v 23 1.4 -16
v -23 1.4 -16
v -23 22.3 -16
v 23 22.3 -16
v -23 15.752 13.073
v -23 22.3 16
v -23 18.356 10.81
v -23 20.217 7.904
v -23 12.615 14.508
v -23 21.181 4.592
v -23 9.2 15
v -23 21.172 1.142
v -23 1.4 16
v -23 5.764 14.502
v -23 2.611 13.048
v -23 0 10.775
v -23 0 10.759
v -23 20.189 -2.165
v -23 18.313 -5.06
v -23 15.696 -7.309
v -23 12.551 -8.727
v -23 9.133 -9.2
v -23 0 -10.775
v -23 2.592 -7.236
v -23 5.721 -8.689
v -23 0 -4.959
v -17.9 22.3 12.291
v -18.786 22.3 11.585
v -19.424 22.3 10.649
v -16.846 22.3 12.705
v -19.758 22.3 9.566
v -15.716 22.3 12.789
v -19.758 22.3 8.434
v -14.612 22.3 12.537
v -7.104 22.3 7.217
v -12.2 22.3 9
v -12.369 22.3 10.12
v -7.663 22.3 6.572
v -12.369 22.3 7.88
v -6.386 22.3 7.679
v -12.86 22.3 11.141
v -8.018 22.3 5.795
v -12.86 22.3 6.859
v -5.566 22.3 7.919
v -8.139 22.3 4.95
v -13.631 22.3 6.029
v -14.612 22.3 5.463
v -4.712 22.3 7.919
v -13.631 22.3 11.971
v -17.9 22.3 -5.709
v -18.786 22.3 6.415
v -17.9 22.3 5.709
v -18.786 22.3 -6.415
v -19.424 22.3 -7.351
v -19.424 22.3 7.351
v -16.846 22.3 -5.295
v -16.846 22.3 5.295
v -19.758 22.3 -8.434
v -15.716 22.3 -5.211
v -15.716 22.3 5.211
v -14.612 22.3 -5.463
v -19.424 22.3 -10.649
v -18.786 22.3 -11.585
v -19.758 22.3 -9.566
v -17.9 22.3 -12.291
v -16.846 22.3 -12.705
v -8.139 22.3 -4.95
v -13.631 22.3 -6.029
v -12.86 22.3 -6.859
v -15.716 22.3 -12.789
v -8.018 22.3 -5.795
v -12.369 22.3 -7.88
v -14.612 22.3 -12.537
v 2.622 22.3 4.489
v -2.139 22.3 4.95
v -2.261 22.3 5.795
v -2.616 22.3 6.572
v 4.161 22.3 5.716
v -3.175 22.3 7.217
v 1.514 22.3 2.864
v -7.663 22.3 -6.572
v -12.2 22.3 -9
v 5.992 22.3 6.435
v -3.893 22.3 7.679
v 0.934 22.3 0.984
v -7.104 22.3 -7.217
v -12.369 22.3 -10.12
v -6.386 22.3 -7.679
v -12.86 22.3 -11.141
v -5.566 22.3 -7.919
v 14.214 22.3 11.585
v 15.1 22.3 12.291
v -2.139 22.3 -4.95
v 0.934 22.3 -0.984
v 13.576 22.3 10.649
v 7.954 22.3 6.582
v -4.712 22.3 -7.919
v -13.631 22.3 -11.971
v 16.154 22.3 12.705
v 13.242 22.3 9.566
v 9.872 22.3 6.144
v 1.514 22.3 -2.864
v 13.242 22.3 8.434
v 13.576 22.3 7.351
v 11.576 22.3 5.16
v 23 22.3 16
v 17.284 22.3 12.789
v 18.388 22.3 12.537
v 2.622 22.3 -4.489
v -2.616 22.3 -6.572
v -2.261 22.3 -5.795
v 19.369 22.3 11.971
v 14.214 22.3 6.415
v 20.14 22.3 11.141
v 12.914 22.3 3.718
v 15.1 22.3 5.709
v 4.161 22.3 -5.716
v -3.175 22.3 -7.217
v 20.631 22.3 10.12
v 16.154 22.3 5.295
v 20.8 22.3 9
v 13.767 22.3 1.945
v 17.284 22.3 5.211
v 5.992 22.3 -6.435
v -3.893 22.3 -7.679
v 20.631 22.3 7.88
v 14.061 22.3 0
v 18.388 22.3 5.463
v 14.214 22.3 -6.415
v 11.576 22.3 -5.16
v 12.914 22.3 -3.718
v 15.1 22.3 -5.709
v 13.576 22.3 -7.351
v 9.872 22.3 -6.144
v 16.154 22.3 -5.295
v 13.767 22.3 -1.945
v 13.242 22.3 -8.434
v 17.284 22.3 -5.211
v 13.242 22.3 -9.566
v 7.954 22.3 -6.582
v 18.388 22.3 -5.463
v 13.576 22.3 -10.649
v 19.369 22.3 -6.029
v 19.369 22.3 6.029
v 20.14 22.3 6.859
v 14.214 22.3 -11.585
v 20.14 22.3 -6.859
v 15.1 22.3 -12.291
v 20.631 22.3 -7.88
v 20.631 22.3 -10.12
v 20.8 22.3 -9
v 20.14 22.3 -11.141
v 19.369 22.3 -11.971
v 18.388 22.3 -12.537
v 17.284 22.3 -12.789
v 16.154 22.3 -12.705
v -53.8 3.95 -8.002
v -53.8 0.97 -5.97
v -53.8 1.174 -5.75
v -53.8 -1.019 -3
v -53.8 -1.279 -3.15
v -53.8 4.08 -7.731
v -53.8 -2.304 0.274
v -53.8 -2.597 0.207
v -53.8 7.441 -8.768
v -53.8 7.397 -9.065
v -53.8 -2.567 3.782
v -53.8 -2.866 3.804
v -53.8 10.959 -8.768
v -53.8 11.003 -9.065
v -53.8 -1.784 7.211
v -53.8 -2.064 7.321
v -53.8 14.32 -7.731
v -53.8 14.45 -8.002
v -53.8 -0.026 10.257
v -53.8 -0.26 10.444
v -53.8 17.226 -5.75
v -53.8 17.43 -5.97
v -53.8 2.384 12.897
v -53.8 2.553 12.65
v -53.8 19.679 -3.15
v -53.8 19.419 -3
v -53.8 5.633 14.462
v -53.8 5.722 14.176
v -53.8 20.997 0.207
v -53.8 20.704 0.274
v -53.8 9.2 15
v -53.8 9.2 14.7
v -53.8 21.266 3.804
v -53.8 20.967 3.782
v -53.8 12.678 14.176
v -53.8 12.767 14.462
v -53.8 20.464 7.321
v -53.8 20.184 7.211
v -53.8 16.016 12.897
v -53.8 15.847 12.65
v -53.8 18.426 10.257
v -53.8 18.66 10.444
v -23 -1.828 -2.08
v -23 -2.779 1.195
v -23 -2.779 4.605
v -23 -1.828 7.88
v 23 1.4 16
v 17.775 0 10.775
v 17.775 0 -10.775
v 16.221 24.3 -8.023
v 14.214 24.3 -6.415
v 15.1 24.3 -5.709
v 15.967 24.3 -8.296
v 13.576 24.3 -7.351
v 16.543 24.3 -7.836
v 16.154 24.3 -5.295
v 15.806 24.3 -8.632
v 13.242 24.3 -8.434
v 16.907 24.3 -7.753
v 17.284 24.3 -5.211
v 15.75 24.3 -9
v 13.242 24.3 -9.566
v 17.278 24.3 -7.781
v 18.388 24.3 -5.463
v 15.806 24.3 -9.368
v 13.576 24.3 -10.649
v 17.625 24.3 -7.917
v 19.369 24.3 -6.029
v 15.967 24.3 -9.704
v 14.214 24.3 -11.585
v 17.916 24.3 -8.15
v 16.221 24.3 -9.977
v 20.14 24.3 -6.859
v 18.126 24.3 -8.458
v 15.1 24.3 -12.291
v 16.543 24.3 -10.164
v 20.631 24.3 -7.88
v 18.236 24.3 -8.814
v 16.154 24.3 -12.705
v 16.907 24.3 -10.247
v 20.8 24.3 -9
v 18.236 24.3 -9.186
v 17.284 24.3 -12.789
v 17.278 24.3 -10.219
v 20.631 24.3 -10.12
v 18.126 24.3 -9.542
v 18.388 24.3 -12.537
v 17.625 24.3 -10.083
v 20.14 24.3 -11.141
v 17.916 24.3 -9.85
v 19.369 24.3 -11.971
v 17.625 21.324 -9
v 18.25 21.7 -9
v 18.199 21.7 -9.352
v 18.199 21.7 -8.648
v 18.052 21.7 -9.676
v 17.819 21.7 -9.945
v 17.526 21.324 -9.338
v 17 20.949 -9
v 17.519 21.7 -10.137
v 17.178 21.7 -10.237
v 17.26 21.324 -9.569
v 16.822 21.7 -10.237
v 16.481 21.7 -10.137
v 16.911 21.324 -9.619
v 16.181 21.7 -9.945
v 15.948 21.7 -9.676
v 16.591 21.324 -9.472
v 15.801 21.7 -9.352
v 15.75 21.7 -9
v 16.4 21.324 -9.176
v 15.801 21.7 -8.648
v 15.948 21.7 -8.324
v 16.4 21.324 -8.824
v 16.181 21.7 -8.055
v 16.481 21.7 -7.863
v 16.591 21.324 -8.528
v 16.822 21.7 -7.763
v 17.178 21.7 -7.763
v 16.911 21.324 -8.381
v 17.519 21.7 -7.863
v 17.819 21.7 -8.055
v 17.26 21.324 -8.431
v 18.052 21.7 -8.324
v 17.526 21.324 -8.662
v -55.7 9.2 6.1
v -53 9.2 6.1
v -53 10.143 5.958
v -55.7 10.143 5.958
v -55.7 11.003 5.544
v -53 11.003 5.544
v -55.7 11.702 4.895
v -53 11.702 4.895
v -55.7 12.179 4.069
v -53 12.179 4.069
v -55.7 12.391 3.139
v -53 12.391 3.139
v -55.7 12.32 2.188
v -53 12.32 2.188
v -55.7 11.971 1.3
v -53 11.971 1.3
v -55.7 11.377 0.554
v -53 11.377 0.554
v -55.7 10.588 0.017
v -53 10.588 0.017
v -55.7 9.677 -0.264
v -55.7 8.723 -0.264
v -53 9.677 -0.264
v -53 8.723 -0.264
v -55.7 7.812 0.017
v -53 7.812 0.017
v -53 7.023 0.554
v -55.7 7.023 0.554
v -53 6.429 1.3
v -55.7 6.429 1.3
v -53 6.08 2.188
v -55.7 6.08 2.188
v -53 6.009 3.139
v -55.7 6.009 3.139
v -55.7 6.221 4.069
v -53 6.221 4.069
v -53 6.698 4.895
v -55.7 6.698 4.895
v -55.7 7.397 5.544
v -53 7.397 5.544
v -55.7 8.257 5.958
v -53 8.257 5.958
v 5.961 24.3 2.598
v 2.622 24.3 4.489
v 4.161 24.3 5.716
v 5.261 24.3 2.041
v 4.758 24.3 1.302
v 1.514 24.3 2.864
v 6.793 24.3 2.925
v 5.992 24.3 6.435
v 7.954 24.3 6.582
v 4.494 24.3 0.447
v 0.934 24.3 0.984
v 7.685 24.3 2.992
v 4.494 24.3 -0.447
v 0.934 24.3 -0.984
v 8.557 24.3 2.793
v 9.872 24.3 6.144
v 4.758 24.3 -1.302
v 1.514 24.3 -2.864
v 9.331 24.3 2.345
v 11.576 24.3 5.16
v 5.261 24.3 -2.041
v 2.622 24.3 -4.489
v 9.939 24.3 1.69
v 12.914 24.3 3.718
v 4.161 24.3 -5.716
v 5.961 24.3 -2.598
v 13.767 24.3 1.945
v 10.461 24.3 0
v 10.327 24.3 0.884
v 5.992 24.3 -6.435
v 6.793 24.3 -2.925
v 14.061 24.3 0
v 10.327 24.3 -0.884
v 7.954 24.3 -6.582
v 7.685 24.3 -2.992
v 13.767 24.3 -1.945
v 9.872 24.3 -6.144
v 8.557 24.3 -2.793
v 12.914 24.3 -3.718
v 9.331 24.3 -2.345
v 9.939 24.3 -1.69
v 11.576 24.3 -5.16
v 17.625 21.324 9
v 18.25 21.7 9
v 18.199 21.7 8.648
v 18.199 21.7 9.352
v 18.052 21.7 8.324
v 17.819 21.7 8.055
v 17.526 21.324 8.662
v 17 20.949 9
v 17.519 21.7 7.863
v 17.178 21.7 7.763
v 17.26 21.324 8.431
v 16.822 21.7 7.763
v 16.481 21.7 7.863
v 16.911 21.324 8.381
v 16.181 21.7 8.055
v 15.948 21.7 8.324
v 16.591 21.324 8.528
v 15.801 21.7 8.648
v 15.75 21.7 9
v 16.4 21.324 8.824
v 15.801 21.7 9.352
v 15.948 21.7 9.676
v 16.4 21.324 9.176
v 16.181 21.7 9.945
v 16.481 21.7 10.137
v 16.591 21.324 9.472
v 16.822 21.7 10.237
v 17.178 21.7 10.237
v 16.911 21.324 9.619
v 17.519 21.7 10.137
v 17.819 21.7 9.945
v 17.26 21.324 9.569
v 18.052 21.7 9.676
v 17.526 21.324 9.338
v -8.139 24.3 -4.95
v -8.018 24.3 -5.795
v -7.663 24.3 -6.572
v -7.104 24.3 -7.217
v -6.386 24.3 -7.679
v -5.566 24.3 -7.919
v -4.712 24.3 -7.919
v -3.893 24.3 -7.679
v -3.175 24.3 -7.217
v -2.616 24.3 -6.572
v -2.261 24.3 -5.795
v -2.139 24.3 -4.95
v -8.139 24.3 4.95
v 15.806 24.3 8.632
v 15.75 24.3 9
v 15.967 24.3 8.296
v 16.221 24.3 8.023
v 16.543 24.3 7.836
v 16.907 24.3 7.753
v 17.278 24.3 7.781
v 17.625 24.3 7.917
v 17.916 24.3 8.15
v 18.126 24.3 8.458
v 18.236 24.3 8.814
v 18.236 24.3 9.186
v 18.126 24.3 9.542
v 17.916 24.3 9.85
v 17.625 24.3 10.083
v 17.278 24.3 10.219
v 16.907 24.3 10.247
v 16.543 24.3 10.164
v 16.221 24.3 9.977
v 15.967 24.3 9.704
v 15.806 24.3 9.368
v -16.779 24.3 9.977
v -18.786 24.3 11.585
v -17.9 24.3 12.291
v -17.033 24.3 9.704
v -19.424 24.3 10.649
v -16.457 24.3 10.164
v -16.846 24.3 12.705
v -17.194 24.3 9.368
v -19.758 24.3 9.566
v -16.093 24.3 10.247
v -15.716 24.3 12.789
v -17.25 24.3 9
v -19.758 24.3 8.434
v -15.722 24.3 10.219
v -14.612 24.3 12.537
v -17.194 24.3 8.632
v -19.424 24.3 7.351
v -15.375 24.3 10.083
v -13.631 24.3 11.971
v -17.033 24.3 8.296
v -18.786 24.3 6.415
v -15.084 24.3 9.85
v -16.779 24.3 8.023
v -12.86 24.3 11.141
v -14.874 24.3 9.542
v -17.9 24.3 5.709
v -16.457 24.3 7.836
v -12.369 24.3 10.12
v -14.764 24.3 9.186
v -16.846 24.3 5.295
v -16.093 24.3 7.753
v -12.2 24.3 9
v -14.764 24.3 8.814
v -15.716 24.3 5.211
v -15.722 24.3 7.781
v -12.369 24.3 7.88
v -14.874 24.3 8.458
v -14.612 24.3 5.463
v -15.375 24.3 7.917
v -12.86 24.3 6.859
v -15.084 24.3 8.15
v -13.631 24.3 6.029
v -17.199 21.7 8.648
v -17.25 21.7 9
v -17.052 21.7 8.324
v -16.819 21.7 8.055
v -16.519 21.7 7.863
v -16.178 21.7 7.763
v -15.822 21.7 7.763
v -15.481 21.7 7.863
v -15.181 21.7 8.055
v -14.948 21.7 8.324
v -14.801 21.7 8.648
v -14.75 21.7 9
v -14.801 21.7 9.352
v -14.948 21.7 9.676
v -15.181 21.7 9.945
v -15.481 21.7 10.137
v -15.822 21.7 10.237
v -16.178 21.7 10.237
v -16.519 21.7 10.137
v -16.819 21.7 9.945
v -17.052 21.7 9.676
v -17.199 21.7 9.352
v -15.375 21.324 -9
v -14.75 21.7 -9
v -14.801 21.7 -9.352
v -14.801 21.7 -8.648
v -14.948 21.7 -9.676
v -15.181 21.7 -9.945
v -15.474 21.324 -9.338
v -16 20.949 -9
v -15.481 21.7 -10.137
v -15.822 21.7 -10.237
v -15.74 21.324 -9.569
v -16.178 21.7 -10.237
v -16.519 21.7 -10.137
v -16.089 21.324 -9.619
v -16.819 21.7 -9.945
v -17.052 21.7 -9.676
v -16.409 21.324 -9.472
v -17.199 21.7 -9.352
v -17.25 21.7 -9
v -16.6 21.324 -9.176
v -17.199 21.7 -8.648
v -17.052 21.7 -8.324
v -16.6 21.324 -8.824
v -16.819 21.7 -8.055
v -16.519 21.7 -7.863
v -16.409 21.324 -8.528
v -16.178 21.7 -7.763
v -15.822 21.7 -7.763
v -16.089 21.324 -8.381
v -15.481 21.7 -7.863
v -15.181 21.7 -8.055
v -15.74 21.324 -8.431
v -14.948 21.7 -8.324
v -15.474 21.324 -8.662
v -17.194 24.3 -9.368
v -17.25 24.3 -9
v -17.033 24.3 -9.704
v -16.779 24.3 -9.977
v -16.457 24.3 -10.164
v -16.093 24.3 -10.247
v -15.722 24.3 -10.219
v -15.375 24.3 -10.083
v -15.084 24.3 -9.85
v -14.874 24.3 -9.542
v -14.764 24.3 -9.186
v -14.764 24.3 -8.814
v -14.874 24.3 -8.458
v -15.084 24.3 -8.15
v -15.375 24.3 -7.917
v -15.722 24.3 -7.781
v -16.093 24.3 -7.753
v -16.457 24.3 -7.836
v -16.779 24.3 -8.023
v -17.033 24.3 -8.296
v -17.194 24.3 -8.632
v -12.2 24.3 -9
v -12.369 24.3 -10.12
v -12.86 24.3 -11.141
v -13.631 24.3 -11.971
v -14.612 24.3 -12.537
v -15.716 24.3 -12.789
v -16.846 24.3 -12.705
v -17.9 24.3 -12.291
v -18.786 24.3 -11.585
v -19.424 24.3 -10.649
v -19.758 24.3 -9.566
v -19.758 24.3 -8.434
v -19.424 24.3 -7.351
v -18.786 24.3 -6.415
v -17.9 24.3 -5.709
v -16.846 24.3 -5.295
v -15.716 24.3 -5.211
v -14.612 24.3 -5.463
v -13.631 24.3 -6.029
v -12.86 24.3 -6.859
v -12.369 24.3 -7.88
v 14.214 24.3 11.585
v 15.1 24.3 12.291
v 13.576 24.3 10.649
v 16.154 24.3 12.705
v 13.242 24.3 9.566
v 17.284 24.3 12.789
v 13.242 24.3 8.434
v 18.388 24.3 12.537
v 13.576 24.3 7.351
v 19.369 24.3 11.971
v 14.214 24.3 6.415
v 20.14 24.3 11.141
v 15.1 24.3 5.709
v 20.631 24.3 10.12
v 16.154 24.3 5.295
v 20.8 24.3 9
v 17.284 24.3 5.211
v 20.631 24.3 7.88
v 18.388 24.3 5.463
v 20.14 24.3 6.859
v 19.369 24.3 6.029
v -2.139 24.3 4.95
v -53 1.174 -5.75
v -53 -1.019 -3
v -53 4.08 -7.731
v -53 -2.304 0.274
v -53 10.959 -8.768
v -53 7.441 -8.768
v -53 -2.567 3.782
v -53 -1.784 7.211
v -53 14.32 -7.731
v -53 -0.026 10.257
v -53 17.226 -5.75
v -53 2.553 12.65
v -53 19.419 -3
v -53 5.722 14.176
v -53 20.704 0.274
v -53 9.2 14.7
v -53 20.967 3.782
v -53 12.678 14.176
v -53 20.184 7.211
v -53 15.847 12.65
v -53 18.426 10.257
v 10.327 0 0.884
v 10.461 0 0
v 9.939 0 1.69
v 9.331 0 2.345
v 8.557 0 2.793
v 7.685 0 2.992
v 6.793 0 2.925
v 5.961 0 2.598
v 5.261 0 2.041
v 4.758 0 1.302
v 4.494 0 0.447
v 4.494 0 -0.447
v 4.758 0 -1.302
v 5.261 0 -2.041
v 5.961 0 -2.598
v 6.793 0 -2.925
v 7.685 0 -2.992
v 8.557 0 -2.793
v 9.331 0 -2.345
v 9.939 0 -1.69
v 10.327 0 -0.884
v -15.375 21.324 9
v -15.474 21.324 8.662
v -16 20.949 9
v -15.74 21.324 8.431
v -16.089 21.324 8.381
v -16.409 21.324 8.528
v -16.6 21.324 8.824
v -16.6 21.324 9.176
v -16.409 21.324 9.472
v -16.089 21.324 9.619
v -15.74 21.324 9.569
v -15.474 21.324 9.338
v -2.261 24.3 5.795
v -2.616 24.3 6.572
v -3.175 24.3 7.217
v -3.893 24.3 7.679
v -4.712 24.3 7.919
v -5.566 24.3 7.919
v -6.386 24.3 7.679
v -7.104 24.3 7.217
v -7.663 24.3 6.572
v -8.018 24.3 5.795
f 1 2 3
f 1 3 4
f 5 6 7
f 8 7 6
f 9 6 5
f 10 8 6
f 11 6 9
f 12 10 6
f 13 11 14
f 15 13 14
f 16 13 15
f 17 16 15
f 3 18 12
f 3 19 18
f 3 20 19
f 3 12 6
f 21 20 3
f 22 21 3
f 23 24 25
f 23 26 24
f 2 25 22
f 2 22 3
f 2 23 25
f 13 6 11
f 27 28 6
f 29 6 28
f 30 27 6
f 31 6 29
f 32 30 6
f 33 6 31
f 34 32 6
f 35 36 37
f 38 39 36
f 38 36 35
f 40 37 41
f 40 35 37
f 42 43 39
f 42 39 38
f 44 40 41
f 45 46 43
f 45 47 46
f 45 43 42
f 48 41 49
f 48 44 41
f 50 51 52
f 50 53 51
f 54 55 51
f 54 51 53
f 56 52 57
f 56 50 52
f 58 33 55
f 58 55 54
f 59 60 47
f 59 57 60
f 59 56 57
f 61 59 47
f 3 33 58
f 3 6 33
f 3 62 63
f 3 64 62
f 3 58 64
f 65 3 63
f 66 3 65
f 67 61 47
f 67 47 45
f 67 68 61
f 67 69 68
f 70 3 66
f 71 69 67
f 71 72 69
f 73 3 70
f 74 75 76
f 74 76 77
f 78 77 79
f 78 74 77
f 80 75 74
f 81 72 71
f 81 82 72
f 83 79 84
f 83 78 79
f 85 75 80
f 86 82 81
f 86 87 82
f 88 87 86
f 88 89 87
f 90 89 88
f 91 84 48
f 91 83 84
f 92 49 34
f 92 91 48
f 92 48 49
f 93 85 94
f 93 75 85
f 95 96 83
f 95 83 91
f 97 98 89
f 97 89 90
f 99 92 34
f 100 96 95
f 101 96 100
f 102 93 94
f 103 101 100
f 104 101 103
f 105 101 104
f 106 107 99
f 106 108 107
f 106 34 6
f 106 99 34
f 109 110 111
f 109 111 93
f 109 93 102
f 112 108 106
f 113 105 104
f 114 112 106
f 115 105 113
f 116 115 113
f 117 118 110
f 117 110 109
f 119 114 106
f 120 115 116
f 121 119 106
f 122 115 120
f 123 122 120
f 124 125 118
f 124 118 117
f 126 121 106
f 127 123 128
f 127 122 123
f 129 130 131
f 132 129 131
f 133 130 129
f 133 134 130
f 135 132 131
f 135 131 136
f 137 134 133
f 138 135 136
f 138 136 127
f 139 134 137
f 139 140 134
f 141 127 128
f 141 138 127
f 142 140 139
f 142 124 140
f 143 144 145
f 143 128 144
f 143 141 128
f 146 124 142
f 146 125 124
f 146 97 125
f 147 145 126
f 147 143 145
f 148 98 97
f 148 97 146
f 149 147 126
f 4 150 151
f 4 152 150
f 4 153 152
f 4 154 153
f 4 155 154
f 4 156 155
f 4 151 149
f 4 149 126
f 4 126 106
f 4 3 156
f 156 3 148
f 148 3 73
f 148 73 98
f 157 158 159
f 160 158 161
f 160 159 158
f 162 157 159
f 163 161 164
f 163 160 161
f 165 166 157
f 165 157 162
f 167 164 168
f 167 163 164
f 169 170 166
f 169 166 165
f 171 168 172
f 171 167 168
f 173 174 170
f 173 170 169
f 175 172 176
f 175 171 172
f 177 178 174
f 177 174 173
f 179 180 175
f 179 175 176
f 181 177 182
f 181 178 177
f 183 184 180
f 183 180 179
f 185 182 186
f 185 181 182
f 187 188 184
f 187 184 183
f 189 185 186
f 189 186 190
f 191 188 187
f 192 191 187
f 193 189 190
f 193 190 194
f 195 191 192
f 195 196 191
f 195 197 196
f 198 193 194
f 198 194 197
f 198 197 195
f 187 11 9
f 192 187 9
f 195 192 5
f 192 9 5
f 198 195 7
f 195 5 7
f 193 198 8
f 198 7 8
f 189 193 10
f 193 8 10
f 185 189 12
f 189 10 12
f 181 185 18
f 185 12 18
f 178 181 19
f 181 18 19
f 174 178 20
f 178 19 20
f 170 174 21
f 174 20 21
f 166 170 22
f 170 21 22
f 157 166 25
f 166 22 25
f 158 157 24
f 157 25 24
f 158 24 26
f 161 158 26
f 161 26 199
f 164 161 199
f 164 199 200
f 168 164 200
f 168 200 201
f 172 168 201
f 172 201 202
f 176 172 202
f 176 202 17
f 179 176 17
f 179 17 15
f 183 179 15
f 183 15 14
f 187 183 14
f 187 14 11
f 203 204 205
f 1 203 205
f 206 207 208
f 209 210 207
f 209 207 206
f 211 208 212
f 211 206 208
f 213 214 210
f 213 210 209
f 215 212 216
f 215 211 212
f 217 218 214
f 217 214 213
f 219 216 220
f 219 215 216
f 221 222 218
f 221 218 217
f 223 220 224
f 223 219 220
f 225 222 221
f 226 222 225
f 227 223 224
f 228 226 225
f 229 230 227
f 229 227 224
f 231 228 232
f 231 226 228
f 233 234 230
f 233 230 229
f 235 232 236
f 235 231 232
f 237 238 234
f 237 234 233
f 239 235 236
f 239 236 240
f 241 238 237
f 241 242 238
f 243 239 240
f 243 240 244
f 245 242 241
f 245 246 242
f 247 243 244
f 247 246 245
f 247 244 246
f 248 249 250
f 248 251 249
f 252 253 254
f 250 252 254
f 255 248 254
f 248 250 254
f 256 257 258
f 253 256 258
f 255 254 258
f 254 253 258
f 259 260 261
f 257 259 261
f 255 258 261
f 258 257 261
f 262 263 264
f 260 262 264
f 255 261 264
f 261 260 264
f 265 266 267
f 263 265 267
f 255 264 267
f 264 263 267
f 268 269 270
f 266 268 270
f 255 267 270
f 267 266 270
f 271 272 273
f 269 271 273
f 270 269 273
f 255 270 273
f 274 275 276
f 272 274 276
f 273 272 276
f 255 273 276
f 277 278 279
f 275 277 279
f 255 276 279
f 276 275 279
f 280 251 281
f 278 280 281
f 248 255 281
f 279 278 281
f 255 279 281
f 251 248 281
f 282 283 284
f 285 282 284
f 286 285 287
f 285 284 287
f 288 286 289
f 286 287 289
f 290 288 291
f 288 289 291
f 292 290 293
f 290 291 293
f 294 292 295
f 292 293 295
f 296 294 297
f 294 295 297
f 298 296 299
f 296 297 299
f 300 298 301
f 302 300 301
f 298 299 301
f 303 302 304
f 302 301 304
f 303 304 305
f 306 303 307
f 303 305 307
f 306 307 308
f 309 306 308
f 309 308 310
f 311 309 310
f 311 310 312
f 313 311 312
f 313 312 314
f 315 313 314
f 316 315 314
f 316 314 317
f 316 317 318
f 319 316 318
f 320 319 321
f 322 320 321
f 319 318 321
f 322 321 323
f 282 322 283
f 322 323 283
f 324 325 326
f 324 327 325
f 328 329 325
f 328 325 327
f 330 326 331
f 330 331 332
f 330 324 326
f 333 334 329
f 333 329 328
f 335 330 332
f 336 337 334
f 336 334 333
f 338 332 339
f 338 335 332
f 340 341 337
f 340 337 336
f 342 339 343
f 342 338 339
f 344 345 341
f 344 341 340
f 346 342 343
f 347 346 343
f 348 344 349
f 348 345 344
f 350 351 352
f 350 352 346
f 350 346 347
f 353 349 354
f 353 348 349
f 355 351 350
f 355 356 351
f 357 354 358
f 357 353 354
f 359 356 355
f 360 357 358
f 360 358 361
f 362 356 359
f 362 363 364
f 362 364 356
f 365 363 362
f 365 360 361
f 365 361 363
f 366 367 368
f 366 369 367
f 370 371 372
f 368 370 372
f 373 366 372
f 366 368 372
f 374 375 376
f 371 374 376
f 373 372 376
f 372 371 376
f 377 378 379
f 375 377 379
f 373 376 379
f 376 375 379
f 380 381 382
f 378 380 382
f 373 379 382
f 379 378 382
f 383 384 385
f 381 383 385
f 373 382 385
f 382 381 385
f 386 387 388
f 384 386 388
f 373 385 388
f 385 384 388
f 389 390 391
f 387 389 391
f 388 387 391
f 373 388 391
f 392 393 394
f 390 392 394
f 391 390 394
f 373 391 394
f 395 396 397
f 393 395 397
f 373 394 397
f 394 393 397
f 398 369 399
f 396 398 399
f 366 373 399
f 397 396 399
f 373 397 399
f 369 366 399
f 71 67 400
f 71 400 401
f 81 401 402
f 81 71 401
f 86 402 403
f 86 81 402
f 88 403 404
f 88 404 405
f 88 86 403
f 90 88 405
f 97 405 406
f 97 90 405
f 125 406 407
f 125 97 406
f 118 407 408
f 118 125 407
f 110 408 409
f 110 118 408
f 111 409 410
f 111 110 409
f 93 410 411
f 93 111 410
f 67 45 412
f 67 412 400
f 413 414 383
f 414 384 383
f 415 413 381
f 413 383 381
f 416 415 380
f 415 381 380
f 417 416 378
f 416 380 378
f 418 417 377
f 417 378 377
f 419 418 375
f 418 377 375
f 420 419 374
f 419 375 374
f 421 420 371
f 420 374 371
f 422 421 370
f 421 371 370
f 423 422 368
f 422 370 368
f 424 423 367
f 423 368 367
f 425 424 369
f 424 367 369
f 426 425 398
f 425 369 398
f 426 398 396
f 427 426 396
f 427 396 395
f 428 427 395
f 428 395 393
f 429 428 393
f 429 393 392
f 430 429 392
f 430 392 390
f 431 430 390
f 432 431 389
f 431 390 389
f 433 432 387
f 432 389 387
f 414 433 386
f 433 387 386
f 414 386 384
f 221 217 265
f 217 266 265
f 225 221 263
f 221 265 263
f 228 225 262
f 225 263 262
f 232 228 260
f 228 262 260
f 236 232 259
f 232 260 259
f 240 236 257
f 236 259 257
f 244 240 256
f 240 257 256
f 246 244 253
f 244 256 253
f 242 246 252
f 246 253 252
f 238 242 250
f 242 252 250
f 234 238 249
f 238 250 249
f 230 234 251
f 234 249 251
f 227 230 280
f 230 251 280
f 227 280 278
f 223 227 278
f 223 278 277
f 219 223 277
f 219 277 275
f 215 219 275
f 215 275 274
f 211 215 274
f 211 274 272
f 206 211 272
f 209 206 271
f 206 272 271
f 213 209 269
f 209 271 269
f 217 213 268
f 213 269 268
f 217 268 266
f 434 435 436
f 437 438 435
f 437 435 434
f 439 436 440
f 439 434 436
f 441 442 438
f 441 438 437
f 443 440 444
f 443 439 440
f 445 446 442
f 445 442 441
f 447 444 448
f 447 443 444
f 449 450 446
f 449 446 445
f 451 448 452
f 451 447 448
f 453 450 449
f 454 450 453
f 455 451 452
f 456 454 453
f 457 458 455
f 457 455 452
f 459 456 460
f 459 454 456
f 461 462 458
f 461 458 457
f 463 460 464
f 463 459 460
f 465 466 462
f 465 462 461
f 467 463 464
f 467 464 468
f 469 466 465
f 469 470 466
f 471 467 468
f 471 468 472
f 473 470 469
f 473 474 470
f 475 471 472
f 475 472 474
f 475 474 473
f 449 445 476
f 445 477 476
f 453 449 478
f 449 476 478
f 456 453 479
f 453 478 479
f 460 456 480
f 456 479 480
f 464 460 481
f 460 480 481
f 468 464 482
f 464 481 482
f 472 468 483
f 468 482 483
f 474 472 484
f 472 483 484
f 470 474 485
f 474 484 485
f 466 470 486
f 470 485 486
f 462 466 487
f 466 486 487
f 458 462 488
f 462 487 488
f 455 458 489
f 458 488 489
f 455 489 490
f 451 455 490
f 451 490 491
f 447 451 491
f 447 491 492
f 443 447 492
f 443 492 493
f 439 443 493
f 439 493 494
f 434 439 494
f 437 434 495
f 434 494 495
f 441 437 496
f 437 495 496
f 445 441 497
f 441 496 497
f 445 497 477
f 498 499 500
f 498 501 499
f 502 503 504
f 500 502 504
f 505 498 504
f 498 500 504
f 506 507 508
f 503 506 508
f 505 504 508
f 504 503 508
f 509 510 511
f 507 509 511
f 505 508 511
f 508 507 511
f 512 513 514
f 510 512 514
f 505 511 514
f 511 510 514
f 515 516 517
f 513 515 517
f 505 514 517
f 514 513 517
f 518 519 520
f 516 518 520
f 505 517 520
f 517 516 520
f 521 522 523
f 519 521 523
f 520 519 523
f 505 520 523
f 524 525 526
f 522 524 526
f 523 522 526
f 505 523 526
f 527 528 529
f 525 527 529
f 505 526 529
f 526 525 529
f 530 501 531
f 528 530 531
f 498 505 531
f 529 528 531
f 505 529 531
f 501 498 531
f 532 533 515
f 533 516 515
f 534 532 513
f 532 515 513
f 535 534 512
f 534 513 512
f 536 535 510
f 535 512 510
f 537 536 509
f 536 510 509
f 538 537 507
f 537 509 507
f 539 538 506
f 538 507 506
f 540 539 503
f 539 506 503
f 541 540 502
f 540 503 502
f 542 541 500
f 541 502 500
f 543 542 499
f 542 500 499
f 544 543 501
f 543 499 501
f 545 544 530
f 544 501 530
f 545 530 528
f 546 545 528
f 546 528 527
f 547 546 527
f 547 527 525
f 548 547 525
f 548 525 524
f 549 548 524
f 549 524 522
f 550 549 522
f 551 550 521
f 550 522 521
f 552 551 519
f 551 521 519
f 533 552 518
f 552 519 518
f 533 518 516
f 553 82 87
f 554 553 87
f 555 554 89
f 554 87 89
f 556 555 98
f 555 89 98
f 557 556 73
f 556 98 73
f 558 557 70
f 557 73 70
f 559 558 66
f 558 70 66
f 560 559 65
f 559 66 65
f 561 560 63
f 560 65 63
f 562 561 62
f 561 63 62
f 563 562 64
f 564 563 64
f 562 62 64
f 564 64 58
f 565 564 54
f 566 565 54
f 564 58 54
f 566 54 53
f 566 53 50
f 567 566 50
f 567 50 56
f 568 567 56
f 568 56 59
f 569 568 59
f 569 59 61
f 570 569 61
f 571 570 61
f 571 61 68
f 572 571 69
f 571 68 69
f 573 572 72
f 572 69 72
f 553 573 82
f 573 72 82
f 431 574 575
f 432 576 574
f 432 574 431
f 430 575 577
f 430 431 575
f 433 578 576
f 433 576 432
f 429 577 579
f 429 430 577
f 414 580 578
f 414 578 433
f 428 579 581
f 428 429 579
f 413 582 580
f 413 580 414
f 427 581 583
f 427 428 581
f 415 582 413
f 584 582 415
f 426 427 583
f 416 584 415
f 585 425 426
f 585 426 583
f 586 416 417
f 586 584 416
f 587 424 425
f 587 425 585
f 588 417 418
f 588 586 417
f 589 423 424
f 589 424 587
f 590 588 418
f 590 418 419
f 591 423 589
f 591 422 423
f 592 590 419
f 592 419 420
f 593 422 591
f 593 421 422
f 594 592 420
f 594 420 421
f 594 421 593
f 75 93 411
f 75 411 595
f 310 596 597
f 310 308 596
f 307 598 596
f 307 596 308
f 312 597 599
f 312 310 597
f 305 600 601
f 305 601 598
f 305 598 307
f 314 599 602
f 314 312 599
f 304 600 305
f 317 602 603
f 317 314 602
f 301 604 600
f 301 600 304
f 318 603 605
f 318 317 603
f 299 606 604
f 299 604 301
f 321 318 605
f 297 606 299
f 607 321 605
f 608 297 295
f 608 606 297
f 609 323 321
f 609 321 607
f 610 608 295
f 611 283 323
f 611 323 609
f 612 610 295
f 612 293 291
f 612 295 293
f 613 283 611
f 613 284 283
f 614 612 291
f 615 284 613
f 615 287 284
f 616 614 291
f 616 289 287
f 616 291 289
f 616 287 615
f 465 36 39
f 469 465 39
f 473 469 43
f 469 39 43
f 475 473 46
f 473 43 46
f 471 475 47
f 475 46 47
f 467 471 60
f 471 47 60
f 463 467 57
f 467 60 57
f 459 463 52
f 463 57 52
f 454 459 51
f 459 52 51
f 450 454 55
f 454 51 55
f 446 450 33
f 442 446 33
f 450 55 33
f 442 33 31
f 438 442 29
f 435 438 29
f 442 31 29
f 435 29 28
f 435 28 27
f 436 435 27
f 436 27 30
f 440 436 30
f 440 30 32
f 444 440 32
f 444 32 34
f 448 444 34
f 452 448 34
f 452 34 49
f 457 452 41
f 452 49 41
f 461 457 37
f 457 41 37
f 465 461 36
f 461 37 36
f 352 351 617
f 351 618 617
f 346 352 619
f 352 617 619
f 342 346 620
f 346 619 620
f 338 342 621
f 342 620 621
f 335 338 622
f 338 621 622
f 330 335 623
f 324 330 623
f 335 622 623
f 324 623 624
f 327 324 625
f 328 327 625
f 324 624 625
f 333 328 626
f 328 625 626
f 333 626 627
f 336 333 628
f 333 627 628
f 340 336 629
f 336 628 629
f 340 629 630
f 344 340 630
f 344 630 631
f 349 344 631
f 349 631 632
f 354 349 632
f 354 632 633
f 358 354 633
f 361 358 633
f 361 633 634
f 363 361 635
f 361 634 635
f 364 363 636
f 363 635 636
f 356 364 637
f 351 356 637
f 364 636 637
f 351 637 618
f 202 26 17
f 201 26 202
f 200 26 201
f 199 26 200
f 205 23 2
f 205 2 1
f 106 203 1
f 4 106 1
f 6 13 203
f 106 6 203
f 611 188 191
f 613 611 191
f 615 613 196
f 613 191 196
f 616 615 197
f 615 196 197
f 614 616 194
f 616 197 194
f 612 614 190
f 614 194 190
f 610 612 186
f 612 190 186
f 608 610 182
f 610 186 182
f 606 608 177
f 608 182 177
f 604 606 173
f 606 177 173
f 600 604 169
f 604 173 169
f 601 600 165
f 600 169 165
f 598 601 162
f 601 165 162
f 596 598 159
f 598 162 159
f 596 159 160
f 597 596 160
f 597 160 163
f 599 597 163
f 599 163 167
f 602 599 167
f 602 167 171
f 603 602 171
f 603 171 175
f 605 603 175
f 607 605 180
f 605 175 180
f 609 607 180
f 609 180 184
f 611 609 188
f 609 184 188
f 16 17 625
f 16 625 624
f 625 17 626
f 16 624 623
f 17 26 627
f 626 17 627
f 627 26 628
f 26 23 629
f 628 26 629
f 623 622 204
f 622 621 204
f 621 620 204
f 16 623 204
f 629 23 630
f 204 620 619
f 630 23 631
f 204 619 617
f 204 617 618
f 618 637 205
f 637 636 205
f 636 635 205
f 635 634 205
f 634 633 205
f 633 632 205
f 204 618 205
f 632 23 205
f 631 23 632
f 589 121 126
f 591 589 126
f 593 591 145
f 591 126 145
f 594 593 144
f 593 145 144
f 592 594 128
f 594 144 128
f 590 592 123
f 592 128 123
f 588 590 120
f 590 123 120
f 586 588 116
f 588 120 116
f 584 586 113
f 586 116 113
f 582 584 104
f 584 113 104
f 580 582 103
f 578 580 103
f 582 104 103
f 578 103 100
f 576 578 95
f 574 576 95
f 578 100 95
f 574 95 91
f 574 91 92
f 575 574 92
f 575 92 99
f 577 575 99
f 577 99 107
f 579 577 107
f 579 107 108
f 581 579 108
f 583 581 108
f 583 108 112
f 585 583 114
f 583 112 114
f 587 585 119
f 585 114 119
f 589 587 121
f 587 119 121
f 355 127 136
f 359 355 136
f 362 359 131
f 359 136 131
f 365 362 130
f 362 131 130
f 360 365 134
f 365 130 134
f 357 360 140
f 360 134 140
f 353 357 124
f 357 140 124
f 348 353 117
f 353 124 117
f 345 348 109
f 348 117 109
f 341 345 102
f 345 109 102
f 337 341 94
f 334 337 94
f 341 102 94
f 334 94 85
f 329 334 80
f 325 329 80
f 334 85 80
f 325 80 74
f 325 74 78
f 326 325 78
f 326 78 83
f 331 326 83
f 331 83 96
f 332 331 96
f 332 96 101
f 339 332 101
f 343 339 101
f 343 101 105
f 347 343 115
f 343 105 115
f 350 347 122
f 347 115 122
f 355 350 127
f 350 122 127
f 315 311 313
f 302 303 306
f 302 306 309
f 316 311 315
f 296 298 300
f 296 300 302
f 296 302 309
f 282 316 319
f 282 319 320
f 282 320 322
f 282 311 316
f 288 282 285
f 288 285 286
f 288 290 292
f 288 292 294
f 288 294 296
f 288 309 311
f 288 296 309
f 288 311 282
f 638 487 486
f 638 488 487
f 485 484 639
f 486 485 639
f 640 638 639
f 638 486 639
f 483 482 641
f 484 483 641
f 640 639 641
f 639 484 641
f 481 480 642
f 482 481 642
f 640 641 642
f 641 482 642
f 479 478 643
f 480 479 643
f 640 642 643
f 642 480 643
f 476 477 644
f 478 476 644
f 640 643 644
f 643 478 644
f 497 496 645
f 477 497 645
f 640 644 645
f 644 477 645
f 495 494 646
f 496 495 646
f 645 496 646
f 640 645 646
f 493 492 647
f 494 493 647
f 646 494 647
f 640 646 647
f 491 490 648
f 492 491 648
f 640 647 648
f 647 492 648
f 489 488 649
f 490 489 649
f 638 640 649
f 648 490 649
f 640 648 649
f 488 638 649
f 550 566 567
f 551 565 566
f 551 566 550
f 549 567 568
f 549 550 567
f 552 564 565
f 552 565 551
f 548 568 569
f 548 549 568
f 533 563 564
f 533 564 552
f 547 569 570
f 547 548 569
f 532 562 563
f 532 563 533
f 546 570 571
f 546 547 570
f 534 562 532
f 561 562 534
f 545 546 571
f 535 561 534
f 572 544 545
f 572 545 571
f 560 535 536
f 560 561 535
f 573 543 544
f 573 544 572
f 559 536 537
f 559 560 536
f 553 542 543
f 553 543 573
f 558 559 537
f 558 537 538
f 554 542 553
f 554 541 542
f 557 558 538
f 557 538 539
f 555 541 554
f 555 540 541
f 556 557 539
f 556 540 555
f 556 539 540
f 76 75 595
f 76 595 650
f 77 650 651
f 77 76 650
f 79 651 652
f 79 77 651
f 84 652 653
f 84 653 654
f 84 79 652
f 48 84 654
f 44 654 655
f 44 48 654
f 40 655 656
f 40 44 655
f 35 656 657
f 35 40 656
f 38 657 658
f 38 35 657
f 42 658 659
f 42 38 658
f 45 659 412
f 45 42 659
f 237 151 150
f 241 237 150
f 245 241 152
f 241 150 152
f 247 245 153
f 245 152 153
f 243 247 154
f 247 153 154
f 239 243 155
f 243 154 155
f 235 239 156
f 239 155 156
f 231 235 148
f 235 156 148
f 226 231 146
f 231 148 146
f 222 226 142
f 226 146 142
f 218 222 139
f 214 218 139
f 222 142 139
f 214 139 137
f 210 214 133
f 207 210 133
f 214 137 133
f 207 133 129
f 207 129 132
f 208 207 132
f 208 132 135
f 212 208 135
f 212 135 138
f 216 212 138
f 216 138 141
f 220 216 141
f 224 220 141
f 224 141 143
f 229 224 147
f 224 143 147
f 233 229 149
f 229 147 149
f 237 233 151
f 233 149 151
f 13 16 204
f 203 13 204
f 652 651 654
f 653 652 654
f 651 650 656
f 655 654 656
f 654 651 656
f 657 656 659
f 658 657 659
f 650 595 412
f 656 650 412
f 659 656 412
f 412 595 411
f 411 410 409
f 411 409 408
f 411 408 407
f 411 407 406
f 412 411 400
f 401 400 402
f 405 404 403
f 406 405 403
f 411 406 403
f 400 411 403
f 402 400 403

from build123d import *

# Parameters (mm, degrees)
SKETCH1_W                       = 46
SKETCH1_H                       = 32
SKETCH1_R                       = 3
BOSS_EXTRUDE1_DEPTH             = 22.3
SKETCH3_R                       = 3.8
SKETCH3_R_2                     = 6.6
BOSS_EXTRUDE3_DEPTH             = 2
SKETCH4_R                       = 3
CUT_EXTRUDE1_DEPTH              = 3
SKETCH2_R                       = 12.1
BOSS_EXTRUDE2_DEPTH             = 30.8
CHAMFER1_SIZE                   = 1.4
CHAMFER1_SIZE2                  = 5.224871131
CHAMFER1_PART_2_SIZE            = 1.4
CHAMFER1_PART_2_SIZE2           = 5.224871131
CHAMFER1_PART_3_SIZE            = 1.4
CHAMFER1_PART_3_SIZE2           = 5.224871131
TAP_DRILL_FOR_M3X0_5_TAP1_D     = 2.5
TAP_DRILL_FOR_M3X0_5_TAP1_DEPTH = 2.6
TAP_DRILL_FOR_M3X0_5_TAP1_TIP   = 0.751075774
SKETCH8_R                       = 11.8
CUT_EXTRUDE2_DEPTH              = 0.8
SKETCH7_R                       = 3.2
BOSS_EXTRUDE5_DEPTH             = 2.7


with BuildPart() as part:
    # Sketch1 → Boss-Extrude1 (new body)
    with BuildSketch(Plane(origin=(0, 0, 0), x_dir=(1, 0, 0), z_dir=(0, 1, 0))):
        Rectangle(SKETCH1_W, SKETCH1_H)
        with Locations((7.460620525, 0)):
            Circle(SKETCH1_R, mode=Mode.SUBTRACT)
    extrude(amount=BOSS_EXTRUDE1_DEPTH)

    # Sketch3 → Boss-Extrude3 (add)
    with BuildSketch(Plane(origin=(0, 22.3, 0), x_dir=(1, 0, 0), z_dir=(0, 1, 0))):
        with Locations((-16, -9)):
            Circle(SKETCH3_R)
        with Locations((7.460620525, 0)):
            Circle(SKETCH3_R_2)
        with Locations((17, -9)):
            Circle(SKETCH3_R)
        with Locations((17, 9)):
            Circle(SKETCH3_R)
        with Locations((-16, 9)):
            Circle(SKETCH3_R)
        with BuildLine():
            Line((-8.139379475, -4.95), (-8.139379475, 4.95))
            ThreePointArc((-8.139379475, 4.95), (-5.139379475, 7.95), (-2.139379475, 4.95))
            Line((-2.139379475, 4.95), (-2.139379475, -4.95))
            ThreePointArc((-2.139379475, -4.95), (-5.139379475, -7.95), (-8.139379475, -4.95))
        make_face()
    extrude(amount=BOSS_EXTRUDE3_DEPTH)

    # Sketch4 → Cut-Extrude1 (cut, through all)
    with BuildSketch(Plane.XZ.offset(-22.3)):
        with Locations((7.460620525, 0)):
            Circle(SKETCH4_R)
    extrude(amount=-CUT_EXTRUDE1_DEPTH, mode=Mode.SUBTRACT)

    # Sketch2 → Boss-Extrude2 (add)
    with BuildSketch(Plane.ZY.offset(23)):
        with Locations((2.9, 9.2)):
            Circle(SKETCH2_R)
    extrude(amount=BOSS_EXTRUDE2_DEPTH)

    # Chamfer1
    chamfer1_edges = [part.edges().sort_by_distance(p)[0] for p in [
        (0, 0, -16),
    ]]
    chamfer1_side = [part.faces().sort_by_distance(p)[0] for p in [
        (0, 11.15, -16),
    ]]
    chamfer(chamfer1_edges, length=CHAMFER1_SIZE, length2=CHAMFER1_SIZE2, reference=chamfer1_side[0])

    # Chamfer1 part 2
    chamfer1_part_2_edges = [part.edges().sort_by_distance(p)[0] for p in [
        (23, 0, 0),
    ]]
    chamfer1_part_2_side = [part.faces().sort_by_distance(p)[0] for p in [
        (23, 11.15, 0),
    ]]
    chamfer(chamfer1_part_2_edges, length=CHAMFER1_PART_2_SIZE, length2=CHAMFER1_PART_2_SIZE2, reference=chamfer1_part_2_side[0])

    # Chamfer1 part 3
    chamfer1_part_3_edges = [part.edges().sort_by_distance(p)[0] for p in [
        (0, 0, 16),
    ]]
    chamfer1_part_3_side = [part.faces().sort_by_distance(p)[0] for p in [
        (0, 11.15, 16),
    ]]
    chamfer(chamfer1_part_3_edges, length=CHAMFER1_PART_3_SIZE, length2=CHAMFER1_PART_3_SIZE2, reference=chamfer1_part_3_side[0])

    # Tap Drill for M3x0.5 Tap1
    with Locations(Plane(origin=(0, 24.3, 0), x_dir=(1, 0, 0), z_dir=(0, 1, 0))):
        with Locations((-16, -9), (-16, 9), (17, 9), (17, -9)):
            Hole(TAP_DRILL_FOR_M3X0_5_TAP1_D / 2, depth=TAP_DRILL_FOR_M3X0_5_TAP1_DEPTH)
            with Locations((0, 0, -(TAP_DRILL_FOR_M3X0_5_TAP1_DEPTH + TAP_DRILL_FOR_M3X0_5_TAP1_TIP / 2))):  # 118° drill point
                Cone(0, TAP_DRILL_FOR_M3X0_5_TAP1_D / 2, TAP_DRILL_FOR_M3X0_5_TAP1_TIP, mode=Mode.SUBTRACT)

    # Sketch8 → Cut-Extrude2 (cut)
    with BuildSketch(Plane.ZY.offset(53.8)):
        with Locations((2.9, 9.2)):
            Circle(SKETCH8_R)
    extrude(amount=-CUT_EXTRUDE2_DEPTH, mode=Mode.SUBTRACT)

    # Sketch7 → Boss-Extrude5 (add)
    with BuildSketch(Plane.ZY.offset(53)):
        with Locations((2.9, 9.2)):
            Circle(SKETCH7_R)
    extrude(amount=BOSS_EXTRUDE5_DEPTH)


solid = part.part
